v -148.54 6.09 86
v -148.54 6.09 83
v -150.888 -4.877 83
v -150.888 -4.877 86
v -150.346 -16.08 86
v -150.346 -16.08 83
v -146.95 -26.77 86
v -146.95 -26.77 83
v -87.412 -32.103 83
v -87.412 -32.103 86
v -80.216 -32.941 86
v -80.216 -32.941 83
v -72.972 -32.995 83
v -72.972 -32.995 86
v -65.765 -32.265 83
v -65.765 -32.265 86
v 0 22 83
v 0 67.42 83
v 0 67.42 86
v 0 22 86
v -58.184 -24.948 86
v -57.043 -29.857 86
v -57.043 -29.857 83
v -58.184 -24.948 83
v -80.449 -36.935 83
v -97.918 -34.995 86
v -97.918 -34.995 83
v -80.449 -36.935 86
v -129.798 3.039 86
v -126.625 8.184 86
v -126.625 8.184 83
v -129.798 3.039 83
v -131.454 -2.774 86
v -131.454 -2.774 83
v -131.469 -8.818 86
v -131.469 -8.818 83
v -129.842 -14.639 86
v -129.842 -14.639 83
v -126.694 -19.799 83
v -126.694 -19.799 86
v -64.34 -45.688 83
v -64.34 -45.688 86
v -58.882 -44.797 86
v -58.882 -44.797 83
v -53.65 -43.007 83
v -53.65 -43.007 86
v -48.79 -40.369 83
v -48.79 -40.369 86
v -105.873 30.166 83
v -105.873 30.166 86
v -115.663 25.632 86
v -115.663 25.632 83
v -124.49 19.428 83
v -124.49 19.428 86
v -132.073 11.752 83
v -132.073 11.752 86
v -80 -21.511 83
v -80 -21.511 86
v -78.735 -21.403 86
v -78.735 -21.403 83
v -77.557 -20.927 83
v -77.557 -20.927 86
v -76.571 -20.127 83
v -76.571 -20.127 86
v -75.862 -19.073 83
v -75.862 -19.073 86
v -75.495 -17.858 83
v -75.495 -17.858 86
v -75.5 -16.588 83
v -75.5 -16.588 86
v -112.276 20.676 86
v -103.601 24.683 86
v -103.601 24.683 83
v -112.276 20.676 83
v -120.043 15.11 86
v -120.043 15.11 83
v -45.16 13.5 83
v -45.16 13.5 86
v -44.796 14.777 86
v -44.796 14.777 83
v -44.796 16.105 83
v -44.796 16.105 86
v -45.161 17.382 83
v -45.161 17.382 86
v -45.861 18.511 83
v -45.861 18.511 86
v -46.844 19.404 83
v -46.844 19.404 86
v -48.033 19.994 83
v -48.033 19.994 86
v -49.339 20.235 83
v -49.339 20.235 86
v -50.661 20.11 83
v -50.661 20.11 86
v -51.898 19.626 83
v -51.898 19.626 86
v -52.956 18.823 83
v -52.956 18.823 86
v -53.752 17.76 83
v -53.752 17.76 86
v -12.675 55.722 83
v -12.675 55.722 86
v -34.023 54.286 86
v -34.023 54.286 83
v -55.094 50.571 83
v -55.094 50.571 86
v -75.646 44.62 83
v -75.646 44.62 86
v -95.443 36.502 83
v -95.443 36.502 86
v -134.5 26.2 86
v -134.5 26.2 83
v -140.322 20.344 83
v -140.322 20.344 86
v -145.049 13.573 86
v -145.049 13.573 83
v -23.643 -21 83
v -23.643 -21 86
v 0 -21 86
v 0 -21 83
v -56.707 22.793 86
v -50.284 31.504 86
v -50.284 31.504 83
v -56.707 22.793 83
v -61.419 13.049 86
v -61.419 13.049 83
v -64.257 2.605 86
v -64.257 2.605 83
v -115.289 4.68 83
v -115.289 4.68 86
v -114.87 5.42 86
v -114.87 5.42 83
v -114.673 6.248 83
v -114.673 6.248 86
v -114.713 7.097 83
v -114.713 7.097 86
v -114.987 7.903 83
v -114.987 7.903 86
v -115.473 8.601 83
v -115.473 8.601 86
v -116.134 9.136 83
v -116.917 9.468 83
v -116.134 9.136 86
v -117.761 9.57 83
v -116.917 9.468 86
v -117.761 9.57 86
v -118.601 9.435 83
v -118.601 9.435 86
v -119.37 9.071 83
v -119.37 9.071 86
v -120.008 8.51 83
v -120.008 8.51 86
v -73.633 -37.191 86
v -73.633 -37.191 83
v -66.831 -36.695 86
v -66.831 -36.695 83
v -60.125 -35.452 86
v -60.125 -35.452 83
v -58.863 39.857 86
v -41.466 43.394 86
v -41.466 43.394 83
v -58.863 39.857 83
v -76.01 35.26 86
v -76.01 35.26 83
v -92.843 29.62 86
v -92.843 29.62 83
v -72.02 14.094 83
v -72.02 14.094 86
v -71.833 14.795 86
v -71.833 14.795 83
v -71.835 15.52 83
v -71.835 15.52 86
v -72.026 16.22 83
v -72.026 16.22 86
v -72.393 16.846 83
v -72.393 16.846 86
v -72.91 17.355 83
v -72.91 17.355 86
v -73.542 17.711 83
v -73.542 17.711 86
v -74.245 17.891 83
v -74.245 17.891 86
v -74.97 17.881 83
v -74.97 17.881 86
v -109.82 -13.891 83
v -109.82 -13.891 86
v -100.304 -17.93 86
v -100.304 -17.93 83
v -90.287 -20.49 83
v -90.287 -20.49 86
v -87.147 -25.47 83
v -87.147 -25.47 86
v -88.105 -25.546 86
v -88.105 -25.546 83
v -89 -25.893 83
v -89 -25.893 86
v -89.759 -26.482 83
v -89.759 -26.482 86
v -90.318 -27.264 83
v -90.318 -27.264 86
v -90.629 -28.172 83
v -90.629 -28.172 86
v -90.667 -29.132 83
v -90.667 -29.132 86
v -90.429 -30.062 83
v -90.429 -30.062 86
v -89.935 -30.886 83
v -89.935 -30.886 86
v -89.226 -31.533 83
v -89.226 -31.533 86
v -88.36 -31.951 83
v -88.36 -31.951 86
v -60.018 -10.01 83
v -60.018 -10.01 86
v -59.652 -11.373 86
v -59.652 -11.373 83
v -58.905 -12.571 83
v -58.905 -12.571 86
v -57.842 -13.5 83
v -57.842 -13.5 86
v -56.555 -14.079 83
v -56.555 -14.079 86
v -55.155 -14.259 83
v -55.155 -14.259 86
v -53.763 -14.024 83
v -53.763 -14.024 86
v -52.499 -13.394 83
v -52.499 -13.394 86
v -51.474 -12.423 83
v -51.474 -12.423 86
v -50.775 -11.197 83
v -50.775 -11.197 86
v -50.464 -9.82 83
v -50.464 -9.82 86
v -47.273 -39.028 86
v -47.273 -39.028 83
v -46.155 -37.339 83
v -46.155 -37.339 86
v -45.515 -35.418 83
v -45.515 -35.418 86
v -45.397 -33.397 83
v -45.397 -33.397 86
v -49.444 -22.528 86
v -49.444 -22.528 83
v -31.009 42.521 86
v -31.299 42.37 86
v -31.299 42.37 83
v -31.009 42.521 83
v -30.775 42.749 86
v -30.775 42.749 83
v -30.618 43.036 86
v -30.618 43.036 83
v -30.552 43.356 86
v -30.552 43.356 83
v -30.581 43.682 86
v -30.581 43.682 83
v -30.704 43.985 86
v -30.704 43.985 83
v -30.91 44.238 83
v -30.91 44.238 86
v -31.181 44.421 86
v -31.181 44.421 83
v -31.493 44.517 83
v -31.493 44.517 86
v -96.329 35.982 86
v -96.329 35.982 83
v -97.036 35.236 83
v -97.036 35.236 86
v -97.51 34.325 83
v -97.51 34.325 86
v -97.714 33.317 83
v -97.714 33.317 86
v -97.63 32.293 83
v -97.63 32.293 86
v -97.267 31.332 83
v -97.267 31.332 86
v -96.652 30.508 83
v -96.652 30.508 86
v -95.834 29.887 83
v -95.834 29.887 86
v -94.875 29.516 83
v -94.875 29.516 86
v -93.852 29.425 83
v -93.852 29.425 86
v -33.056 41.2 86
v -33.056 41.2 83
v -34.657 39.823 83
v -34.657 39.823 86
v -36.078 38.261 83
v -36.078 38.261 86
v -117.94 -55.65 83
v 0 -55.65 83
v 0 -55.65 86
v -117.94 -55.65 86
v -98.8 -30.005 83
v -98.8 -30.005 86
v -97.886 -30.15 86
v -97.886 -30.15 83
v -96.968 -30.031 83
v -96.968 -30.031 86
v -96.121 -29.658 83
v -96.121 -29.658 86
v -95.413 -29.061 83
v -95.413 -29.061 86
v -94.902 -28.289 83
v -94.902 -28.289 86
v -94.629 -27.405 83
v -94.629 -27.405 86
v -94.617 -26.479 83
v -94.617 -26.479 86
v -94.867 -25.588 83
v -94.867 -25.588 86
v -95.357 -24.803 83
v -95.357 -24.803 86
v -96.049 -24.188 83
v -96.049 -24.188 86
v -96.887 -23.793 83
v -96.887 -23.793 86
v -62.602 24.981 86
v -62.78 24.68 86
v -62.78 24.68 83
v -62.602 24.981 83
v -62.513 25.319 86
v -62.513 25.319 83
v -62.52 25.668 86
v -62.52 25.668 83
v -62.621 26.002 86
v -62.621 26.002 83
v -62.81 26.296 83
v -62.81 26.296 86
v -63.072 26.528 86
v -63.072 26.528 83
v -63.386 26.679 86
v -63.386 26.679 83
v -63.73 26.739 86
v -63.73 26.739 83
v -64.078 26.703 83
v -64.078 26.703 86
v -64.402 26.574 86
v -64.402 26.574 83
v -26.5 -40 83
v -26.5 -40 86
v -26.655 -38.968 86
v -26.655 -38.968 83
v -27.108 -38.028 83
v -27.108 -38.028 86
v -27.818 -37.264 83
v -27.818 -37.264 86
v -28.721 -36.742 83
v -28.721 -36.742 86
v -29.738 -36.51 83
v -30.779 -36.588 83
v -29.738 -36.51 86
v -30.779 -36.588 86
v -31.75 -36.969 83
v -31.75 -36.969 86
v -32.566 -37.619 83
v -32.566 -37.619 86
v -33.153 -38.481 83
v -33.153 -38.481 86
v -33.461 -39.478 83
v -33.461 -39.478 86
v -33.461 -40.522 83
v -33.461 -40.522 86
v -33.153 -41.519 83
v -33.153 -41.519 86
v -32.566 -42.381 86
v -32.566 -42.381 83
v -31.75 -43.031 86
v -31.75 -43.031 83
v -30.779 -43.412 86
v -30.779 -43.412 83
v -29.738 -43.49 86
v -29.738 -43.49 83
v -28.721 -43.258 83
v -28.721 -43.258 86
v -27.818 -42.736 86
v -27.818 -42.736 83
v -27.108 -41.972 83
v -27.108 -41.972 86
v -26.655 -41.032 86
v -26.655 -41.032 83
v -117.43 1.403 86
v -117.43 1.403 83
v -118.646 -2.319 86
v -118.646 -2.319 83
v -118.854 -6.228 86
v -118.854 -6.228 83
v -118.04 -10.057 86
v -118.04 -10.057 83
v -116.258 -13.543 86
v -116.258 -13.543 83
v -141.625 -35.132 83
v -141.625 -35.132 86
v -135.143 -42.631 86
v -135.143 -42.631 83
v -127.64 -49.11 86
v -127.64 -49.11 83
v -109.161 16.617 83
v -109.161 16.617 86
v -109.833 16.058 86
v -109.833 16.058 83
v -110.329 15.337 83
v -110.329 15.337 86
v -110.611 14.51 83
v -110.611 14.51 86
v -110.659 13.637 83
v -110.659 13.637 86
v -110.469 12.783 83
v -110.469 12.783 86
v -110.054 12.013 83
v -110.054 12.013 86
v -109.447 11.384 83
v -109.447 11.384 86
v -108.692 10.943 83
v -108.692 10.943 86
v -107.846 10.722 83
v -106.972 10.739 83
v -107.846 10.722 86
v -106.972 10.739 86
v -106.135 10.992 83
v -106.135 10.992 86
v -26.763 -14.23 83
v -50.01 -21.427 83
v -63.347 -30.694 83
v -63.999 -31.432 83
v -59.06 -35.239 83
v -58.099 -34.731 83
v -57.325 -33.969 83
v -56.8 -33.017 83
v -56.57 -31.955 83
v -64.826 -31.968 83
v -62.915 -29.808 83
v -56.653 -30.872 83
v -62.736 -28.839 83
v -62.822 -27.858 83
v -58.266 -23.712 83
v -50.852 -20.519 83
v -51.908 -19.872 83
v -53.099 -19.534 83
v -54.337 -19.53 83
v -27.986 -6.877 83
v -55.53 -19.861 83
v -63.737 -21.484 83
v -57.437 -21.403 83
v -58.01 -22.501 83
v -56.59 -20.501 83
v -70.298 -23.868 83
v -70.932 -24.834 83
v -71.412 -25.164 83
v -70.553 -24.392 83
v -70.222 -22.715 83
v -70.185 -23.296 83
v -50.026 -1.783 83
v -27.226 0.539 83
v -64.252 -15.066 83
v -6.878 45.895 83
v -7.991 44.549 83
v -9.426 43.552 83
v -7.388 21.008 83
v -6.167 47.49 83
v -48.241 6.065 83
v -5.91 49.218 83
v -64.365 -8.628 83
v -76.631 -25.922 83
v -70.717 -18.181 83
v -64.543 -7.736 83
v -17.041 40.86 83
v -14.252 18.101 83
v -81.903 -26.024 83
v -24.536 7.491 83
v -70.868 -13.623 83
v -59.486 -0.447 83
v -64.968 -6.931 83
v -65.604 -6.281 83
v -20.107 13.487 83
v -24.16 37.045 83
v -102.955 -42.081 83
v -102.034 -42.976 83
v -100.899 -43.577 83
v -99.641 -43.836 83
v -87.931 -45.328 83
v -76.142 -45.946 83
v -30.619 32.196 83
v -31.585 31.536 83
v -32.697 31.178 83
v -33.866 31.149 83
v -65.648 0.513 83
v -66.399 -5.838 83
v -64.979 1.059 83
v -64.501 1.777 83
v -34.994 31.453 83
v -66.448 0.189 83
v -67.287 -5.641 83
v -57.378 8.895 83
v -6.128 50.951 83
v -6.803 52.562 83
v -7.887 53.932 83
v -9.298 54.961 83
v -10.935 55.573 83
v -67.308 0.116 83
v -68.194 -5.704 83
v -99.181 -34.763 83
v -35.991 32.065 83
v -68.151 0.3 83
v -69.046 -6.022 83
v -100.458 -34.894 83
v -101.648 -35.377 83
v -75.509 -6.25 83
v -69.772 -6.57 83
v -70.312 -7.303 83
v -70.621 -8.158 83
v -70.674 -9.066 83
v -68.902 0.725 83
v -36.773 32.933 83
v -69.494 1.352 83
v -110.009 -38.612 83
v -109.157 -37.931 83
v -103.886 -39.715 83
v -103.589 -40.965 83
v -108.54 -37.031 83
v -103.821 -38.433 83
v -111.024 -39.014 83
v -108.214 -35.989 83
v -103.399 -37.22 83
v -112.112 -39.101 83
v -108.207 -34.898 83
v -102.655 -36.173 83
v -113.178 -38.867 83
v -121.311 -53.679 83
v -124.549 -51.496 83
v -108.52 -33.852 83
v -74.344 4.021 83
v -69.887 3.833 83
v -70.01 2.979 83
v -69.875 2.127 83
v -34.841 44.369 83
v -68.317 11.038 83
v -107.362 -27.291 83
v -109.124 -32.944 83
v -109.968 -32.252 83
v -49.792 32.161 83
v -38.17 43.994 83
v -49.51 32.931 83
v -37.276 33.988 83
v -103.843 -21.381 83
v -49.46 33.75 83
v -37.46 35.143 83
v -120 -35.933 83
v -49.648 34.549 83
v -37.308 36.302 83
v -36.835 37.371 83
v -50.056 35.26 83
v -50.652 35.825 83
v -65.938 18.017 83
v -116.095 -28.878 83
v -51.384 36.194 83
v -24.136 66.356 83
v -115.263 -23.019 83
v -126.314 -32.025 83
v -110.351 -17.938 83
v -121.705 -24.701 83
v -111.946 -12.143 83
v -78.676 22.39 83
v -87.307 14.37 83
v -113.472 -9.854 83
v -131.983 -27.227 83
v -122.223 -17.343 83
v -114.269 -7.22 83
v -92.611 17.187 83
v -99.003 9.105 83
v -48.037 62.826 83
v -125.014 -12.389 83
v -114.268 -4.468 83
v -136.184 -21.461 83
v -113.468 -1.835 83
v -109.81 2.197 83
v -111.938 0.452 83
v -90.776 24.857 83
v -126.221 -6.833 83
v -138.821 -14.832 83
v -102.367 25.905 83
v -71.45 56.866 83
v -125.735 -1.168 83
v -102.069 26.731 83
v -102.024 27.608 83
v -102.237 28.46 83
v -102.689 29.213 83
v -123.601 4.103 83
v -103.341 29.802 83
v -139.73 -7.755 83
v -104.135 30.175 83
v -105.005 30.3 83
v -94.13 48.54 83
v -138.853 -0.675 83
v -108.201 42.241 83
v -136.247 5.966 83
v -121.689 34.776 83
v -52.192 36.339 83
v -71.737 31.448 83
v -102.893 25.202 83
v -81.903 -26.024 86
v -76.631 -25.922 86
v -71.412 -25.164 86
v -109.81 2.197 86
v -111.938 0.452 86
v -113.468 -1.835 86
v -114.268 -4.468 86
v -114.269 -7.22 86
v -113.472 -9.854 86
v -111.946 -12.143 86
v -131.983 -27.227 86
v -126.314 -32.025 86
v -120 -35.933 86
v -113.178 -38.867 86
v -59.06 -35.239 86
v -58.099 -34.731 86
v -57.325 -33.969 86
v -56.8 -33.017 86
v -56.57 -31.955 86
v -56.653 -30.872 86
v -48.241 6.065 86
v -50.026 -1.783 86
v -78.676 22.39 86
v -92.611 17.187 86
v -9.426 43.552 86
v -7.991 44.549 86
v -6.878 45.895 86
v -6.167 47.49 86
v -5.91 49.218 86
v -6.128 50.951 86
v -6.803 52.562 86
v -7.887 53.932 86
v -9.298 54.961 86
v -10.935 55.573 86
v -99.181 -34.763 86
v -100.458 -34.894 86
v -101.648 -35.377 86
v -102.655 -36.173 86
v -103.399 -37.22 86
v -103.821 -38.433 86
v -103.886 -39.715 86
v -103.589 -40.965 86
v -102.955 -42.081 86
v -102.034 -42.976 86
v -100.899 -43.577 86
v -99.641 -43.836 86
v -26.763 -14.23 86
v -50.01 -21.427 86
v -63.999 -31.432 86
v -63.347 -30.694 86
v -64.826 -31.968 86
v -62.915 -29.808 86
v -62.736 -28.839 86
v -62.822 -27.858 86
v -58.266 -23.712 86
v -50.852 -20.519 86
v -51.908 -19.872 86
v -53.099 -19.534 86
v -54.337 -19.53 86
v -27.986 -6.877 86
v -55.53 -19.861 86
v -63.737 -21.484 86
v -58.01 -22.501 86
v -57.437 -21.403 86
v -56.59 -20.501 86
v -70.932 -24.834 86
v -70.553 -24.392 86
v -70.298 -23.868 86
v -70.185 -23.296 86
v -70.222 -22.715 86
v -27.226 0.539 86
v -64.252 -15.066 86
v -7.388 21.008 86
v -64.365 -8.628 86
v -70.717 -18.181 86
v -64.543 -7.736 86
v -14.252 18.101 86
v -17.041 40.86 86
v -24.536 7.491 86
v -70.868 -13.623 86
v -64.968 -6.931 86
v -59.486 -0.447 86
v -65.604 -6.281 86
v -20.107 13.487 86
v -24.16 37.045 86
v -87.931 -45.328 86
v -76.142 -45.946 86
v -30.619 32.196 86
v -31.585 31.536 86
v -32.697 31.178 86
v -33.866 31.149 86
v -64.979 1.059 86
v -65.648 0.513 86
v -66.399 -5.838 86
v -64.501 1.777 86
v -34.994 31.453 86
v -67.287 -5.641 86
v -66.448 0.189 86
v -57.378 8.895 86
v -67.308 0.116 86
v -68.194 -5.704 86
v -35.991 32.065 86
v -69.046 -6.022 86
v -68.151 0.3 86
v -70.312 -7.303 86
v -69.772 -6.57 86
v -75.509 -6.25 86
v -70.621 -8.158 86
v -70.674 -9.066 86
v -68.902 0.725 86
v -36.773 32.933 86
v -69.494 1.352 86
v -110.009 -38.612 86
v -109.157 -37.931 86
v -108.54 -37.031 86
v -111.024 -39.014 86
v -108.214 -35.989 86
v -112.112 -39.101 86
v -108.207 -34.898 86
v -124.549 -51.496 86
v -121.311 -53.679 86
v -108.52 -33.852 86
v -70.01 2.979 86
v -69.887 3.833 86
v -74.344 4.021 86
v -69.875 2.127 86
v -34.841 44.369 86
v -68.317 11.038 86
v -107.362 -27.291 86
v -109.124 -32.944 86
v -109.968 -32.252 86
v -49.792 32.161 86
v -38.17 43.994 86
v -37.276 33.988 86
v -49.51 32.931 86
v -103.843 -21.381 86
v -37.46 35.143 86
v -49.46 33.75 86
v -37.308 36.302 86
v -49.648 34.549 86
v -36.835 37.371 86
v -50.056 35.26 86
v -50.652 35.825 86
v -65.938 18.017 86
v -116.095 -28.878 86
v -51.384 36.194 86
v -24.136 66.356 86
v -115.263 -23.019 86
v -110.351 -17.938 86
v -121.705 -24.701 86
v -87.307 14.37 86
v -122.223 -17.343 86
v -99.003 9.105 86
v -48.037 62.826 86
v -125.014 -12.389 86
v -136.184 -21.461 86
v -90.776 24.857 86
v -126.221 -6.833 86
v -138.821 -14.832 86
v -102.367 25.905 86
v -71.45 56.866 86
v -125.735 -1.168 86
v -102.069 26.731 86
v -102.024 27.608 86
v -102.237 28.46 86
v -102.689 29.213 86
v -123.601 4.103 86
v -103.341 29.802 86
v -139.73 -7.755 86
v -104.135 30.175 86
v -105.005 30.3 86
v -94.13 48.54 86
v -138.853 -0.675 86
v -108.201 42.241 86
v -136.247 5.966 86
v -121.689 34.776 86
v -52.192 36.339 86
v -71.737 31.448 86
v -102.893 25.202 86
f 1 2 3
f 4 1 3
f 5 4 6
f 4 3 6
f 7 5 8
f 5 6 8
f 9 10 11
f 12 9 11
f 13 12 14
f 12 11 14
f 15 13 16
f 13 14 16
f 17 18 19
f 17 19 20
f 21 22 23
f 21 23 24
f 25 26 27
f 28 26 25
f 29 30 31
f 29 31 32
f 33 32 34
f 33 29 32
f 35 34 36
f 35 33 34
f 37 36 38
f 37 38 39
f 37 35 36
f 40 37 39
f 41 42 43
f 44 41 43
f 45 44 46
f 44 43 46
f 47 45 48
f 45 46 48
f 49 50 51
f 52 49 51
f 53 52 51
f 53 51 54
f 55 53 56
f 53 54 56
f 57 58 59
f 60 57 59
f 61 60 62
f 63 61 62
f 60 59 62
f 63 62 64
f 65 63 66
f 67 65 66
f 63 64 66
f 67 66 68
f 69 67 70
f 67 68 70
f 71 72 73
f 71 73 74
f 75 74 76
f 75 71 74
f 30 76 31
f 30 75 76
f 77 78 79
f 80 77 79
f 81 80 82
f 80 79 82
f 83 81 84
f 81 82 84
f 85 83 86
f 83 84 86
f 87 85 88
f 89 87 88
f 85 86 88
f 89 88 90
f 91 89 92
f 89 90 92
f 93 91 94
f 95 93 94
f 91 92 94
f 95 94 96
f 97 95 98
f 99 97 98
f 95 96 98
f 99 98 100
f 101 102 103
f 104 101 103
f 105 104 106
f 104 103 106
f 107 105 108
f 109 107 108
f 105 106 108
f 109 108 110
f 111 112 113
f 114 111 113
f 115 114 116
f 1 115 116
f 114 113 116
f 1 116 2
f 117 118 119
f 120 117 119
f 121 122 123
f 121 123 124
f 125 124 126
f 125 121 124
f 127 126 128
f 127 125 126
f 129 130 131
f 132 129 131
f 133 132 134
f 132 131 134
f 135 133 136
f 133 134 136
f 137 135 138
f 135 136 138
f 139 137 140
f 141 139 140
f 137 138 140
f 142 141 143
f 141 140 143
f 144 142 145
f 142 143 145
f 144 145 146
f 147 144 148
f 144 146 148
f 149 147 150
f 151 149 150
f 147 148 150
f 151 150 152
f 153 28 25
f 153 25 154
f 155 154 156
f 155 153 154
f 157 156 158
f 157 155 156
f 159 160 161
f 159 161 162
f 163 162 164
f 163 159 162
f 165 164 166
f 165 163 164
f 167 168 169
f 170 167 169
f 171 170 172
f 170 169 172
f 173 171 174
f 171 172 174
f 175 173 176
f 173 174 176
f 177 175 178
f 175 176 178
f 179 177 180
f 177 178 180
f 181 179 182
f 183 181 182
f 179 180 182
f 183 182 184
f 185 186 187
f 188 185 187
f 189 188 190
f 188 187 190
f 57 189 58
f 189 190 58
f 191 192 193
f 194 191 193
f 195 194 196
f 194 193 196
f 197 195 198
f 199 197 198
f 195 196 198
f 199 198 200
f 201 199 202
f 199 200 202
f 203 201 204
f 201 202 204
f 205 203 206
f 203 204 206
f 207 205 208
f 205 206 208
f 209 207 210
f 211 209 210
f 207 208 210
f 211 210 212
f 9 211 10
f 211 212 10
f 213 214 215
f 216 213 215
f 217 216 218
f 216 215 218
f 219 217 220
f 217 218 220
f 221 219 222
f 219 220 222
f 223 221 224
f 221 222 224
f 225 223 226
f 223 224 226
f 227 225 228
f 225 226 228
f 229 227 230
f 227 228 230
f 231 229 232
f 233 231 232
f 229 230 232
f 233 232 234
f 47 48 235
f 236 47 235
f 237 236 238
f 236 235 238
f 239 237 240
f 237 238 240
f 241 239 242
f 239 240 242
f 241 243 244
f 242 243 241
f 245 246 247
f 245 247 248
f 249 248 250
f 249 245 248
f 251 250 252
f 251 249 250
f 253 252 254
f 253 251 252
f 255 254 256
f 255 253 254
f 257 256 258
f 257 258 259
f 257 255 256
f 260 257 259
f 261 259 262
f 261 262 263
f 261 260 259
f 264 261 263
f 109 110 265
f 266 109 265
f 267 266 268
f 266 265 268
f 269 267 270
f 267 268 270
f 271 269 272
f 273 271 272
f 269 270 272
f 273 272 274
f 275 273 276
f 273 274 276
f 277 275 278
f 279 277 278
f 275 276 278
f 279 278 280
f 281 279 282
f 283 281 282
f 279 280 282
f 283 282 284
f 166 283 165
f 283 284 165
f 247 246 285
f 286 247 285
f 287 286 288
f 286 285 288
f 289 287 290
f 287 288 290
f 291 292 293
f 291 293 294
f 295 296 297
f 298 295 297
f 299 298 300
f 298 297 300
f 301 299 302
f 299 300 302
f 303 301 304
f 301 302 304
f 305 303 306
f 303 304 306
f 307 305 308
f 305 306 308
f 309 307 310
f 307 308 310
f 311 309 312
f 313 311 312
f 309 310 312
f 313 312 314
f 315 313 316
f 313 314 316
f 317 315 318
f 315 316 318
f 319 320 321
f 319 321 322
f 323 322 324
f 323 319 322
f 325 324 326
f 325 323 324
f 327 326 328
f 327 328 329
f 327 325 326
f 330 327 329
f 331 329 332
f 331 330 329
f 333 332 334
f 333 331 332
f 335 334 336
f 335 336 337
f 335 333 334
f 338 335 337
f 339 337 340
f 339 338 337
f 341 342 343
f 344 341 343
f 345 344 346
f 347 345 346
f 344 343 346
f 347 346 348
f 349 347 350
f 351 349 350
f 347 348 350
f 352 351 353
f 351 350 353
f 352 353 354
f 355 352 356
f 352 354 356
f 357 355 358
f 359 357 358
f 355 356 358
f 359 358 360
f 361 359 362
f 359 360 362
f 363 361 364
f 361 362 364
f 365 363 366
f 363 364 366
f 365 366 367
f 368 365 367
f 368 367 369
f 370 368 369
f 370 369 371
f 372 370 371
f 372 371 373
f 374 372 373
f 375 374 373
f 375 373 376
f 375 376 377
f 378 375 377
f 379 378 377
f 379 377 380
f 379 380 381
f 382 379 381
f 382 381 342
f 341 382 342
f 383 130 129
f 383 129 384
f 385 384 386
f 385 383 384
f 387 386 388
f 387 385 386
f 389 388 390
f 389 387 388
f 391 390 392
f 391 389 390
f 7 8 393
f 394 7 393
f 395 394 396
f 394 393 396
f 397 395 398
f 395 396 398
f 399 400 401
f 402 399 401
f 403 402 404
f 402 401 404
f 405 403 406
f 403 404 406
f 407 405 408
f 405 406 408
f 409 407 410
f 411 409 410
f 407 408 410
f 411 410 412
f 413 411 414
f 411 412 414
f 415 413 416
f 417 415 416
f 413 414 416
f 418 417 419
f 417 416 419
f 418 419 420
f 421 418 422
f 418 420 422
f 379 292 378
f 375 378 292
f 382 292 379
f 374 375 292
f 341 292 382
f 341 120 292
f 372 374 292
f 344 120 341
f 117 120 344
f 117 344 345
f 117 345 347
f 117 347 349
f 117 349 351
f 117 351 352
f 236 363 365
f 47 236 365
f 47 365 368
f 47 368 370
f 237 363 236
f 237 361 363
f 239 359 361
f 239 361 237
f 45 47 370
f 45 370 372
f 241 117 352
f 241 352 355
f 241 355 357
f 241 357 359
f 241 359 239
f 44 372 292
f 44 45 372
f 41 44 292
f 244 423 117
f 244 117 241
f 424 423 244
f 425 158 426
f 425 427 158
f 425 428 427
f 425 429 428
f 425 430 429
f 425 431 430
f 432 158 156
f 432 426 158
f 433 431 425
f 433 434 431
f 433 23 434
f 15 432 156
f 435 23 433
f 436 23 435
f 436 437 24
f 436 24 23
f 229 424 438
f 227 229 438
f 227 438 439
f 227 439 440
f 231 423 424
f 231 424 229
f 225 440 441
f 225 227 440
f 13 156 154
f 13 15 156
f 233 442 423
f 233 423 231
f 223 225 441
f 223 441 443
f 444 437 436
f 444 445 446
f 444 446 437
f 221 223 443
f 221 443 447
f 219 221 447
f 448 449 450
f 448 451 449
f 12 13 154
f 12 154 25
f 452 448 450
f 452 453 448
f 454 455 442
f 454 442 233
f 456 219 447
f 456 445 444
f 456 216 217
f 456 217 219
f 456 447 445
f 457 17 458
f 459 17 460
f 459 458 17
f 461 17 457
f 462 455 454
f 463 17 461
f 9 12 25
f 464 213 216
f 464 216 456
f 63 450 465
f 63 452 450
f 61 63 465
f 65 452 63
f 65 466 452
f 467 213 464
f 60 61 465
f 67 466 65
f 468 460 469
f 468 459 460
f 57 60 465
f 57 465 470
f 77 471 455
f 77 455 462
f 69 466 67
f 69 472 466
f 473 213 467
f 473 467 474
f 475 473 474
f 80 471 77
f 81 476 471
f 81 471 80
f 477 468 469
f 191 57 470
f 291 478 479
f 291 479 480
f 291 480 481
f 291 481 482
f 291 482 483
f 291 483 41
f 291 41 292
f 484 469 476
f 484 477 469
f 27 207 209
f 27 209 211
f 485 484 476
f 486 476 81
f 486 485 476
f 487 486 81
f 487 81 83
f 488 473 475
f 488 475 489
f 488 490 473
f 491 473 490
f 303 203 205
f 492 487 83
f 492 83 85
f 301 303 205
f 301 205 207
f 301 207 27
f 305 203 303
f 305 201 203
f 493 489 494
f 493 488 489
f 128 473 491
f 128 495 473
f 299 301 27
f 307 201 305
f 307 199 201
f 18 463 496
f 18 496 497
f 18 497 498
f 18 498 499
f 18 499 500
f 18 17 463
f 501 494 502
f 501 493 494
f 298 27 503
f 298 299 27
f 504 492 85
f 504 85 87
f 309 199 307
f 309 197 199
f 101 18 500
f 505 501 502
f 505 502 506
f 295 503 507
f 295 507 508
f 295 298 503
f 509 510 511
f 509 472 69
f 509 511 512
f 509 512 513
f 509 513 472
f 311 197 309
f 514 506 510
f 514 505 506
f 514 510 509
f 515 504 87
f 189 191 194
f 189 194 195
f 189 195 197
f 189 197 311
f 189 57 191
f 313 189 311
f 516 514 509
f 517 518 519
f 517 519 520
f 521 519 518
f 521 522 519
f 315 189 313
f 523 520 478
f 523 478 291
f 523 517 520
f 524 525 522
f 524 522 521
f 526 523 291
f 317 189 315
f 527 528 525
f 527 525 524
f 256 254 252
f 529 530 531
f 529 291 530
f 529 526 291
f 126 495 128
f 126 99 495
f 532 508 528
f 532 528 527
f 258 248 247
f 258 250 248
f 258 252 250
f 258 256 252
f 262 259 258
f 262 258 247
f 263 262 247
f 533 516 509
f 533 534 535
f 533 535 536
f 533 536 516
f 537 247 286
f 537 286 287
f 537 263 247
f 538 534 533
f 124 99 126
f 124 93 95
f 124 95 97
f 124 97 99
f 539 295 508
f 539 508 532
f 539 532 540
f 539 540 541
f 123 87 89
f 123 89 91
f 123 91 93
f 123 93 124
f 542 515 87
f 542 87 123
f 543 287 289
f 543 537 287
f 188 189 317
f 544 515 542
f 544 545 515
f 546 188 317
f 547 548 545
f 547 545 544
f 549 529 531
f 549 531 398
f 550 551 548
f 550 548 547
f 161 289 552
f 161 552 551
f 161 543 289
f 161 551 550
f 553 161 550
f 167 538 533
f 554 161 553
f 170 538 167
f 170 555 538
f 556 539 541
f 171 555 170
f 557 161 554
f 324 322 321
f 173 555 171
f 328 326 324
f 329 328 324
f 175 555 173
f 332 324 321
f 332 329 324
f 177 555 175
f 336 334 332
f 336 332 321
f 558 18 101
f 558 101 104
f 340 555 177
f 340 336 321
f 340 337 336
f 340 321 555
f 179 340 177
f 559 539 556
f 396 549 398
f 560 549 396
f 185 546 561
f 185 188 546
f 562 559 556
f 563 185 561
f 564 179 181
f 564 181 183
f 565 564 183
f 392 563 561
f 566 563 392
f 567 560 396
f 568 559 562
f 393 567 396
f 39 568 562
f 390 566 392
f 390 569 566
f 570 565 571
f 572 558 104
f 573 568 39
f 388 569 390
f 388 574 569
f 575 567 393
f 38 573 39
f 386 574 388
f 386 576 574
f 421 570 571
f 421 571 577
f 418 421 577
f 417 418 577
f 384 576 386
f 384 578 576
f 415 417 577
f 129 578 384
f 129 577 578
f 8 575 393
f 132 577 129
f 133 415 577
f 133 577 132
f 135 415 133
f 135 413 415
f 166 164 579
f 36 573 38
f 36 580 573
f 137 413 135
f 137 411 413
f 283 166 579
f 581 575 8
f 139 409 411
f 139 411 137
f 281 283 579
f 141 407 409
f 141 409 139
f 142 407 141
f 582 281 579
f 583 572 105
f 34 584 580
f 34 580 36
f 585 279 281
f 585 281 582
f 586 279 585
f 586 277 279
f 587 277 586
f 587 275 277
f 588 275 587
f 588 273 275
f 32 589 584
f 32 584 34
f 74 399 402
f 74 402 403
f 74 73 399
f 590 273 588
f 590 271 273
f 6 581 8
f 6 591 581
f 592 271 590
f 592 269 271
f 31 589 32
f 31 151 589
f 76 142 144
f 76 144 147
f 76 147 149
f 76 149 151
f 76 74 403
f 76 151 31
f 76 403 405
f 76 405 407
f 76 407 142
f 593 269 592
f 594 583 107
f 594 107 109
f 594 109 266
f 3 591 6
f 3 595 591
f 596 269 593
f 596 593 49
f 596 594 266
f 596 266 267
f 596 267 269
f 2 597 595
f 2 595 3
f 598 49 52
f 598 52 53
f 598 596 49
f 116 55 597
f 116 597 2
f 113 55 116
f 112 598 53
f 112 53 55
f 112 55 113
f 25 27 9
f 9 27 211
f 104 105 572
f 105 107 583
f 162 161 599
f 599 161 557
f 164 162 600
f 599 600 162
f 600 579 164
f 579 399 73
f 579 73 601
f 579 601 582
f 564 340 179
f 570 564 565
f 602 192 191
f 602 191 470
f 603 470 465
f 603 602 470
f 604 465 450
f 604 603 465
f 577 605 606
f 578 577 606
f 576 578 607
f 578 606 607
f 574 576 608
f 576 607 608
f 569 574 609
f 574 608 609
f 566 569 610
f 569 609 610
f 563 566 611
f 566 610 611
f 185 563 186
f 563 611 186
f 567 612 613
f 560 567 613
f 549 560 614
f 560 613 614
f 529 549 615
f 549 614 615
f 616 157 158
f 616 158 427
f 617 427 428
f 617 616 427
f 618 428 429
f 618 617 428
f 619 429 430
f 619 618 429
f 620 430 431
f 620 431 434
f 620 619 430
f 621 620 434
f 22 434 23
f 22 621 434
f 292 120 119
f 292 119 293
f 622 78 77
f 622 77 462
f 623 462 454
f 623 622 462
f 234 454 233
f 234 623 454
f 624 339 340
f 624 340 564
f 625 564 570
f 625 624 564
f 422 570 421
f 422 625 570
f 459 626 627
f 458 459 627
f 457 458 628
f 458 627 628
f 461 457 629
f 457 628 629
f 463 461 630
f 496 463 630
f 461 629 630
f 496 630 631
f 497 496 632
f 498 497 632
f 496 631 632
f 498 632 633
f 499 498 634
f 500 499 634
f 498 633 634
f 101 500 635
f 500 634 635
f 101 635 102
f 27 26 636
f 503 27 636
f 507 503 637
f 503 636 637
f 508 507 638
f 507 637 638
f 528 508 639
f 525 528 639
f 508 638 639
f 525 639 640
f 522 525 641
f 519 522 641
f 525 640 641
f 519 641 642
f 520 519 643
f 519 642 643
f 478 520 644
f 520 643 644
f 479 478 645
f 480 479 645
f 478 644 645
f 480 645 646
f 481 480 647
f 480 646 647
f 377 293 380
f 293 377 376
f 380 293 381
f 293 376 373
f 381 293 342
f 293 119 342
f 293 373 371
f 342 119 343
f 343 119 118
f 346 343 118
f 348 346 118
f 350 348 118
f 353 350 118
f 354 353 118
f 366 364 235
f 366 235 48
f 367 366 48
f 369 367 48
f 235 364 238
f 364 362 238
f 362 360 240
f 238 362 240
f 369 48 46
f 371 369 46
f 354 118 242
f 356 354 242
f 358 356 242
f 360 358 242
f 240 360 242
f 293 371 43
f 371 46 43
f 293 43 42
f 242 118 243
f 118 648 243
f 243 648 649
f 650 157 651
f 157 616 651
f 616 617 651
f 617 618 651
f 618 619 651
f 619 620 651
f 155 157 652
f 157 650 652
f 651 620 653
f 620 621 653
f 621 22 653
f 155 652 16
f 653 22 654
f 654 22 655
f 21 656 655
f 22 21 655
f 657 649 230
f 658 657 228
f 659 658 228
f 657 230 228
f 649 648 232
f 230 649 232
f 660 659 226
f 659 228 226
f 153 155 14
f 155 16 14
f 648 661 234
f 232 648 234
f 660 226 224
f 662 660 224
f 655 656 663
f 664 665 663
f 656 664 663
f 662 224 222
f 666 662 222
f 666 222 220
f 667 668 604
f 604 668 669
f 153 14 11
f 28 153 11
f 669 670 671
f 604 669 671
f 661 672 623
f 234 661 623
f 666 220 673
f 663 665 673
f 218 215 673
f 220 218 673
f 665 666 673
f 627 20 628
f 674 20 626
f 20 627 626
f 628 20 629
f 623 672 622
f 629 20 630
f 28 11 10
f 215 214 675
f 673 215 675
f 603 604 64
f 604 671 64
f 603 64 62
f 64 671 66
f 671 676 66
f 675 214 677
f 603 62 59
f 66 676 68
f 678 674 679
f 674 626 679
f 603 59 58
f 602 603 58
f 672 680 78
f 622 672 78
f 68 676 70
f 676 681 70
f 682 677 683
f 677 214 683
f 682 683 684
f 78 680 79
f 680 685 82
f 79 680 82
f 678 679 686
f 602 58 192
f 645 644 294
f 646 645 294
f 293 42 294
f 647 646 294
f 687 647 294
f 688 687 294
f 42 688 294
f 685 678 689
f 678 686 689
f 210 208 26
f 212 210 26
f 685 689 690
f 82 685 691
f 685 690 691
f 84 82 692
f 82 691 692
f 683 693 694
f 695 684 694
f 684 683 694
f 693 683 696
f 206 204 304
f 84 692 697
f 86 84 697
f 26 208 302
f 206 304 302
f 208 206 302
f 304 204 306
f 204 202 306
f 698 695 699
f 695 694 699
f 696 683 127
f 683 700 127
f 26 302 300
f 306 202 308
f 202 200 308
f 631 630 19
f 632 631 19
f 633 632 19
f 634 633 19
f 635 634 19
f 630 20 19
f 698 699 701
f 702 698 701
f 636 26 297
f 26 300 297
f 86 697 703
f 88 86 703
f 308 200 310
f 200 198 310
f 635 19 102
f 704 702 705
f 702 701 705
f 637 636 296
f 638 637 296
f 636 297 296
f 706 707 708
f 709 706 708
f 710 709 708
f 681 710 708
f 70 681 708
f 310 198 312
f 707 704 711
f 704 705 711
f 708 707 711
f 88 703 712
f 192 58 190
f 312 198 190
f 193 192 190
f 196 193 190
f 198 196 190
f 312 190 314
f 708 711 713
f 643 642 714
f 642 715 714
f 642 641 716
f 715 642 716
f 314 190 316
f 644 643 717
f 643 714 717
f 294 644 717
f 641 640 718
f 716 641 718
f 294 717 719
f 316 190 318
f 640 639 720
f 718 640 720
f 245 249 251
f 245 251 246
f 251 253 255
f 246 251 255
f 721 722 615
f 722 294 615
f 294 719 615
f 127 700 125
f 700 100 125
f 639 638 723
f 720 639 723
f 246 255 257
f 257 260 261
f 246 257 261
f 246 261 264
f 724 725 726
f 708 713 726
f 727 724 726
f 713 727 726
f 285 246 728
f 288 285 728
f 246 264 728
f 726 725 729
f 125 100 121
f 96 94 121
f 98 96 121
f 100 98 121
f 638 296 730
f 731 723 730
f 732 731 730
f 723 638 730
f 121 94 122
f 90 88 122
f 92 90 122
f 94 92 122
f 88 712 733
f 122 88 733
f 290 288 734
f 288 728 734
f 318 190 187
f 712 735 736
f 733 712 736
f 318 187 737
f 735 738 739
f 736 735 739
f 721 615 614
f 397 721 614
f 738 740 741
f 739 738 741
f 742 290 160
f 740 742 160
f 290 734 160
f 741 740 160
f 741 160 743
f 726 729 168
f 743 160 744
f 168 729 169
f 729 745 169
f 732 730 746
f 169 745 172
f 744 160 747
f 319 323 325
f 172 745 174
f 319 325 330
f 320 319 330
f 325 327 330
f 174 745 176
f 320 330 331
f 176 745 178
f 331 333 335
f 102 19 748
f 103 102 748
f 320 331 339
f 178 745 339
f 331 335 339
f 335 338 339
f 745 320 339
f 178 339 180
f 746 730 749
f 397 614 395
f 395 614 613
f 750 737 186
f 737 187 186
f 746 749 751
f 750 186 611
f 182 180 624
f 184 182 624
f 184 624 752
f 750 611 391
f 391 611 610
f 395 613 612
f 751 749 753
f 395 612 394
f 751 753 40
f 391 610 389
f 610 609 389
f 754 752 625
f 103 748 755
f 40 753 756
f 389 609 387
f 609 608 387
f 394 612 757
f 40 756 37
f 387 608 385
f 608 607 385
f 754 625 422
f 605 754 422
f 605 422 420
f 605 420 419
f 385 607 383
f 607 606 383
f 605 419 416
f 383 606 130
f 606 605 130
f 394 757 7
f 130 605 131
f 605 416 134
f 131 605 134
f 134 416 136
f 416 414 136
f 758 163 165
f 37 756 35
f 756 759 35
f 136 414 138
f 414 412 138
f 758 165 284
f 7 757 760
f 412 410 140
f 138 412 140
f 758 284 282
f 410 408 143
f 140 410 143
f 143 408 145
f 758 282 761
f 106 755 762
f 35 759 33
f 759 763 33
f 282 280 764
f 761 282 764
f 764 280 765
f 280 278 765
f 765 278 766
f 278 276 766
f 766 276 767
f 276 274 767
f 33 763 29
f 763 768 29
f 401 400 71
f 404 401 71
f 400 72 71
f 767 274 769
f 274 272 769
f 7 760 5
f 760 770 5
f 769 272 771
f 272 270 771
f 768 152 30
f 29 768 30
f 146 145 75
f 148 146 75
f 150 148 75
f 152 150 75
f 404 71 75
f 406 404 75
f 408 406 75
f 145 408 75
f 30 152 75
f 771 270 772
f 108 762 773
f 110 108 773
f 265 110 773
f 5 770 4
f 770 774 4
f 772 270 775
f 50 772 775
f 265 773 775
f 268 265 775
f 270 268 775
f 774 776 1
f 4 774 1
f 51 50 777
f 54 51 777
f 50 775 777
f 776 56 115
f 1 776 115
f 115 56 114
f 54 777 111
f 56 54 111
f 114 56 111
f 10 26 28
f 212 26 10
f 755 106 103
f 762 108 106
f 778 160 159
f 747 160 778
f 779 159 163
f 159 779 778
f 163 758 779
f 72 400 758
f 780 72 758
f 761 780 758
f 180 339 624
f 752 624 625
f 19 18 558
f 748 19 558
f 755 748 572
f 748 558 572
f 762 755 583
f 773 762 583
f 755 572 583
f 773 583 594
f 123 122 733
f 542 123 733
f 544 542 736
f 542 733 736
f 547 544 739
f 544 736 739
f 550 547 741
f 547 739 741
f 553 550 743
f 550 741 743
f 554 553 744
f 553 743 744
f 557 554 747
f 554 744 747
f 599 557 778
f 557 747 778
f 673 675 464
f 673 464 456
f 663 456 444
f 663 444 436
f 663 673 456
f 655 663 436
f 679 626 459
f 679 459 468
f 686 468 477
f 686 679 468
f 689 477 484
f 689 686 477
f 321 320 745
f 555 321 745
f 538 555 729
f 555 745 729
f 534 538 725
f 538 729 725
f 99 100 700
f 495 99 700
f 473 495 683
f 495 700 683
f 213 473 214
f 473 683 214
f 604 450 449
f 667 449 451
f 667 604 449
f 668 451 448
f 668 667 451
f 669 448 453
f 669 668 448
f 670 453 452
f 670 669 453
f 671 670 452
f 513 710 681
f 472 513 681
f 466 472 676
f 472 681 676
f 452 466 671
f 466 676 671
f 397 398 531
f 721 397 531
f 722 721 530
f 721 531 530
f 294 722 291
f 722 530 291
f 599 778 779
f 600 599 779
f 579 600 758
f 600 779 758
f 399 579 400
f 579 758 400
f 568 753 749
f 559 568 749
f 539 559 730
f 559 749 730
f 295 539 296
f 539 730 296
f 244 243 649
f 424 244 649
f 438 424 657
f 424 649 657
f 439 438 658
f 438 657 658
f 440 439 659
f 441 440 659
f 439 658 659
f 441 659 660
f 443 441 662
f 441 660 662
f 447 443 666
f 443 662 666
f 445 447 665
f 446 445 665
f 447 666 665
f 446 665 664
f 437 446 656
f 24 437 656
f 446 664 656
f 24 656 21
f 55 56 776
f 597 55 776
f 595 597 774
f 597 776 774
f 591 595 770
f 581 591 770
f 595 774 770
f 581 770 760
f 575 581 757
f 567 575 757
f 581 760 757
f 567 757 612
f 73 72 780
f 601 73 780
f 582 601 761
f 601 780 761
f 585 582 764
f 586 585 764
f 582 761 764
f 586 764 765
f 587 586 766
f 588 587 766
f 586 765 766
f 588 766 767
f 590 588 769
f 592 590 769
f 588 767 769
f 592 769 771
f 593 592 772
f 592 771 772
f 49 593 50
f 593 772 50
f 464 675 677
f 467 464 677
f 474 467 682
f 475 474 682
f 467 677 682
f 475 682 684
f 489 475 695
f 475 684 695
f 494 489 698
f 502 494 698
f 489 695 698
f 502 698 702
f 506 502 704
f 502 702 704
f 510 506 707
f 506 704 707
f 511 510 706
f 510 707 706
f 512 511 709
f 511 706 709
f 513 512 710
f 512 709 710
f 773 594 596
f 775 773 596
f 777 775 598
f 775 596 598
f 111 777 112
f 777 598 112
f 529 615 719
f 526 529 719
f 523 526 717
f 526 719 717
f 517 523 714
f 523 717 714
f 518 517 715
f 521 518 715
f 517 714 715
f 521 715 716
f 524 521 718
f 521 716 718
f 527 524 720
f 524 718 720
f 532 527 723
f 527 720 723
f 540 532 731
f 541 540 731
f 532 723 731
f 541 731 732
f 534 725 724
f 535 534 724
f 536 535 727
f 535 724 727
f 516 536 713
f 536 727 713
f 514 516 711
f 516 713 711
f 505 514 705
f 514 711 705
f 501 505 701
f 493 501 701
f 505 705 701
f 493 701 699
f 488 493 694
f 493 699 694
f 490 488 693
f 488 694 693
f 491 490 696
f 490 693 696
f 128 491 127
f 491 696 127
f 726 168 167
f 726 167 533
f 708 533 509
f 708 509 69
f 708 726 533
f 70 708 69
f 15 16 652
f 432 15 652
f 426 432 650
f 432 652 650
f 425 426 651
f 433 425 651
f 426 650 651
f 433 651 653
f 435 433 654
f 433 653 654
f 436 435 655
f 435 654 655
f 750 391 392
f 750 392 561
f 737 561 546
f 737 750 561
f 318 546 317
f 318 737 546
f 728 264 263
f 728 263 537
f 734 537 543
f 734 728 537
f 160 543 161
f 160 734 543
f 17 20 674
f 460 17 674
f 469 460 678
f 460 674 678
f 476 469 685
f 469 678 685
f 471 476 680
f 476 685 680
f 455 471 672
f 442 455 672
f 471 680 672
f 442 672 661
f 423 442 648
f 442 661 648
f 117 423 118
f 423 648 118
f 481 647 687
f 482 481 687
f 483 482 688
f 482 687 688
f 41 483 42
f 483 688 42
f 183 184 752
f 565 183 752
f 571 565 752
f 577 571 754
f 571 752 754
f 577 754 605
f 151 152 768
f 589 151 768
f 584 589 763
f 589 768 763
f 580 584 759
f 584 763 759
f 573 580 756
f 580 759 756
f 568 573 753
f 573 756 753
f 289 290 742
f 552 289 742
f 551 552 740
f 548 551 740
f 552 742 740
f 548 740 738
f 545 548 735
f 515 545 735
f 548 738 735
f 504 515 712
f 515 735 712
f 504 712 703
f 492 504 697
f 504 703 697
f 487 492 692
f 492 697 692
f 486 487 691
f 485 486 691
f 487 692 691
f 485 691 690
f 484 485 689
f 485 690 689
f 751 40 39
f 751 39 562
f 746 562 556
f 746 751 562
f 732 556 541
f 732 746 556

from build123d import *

# Parameters (mm, degrees)
PAD004_DEPTH        = 3
POCKET007_DEPTH     = 3.001
POCKET008_DEPTH     = 3.001
POCKET009_DEPTH     = 3.001
POCKET010_DEPTH     = 3.001
POCKET011_DEPTH     = 3.001
POCKET012_DEPTH     = 3.001
POCKET013_DEPTH     = 3.001
POCKET014_DEPTH     = 3.001
POCKET015_DEPTH     = 3.001
COPYCOPYSKETCH023_R = 3.5
POCKET033_DEPTH     = 5


with BuildPart() as part:
    # Sketch012 → Pad004 (new body)
    with BuildSketch(Plane.XY):
        with BuildLine():
            Line((0, 67.42), (0, -55.65))
            Line((0, -55.65), (-117.94, -55.65))
            ThreePointArc((-127.64, -49.11), (-122.947197, -52.613151), (-117.94, -55.65))
            ThreePointArc((-146.95, -26.77), (-138.520798, -38.999541), (-127.64, -49.11))
            ThreePointArc((-148.54, 6.09), (-150.980867, -10.496574), (-146.95, -26.77))
            ThreePointArc((-134.5, 26.2), (-142.831473, 17.060618), (-148.54, 6.09))
            ThreePointArc((-94.13, 48.54), (-115.023795, 38.650843), (-134.5, 26.2))
            ThreePointArc((0, 67.42), (-48.036997, 62.826084), (-94.13, 48.54))
        make_face()
    extrude(amount=PAD004_DEPTH)

    # CopySketch001 → Pocket007 (cut, through all)
    with BuildSketch(Plane.XY.offset(3)):
        with BuildLine():
            ThreePointArc((0, 22), (-24.535688, 7.490738), (-23.643181, -21))
            Line((-23.643181, -21), (0, -21))
            Line((0, -21), (0, 22))
        make_face()
        with BuildLine():
            ThreePointArc((-45.15951, 13.5), (-47.417918, 19.740491), (-53.752095, 17.76))
            ThreePointArc((-53.752095, 17.76), (-58.626578, 4.267932), (-60.018385, -10.01))
            ThreePointArc((-60.018385, -10.01), (-55.15457, -14.259051), (-50.463519, -9.82))
            ThreePointArc((-45.15951, 13.5), (-49.299707, 2.178481), (-50.463519, -9.82))
        make_face()
    extrude(amount=-POCKET007_DEPTH, mode=Mode.SUBTRACT)

    # CopySketch002 → Pocket008 (cut, through all)
    with BuildSketch(Plane.XY.offset(3)):
        with BuildLine():
            ThreePointArc((-49.444058, -22.5277), (-54.944649, -19.654794), (-58.184448, -24.9476))
            Line((-57.0427, -29.8572), (-58.184448, -24.9476))
            ThreePointArc((-60.1254, -35.4518), (-57.027903, -33.511958), (-57.0427, -29.8572))
            ThreePointArc((-80.4488, -36.935), (-70.225534, -37.037002), (-60.1254, -35.4518))
            Line((-97.9175, -34.995), (-80.4488, -36.935))
            ThreePointArc((-97.9175, -34.995), (-103.82056, -38.432829), (-99.6413, -43.8364))
            ThreePointArc((-99.6413, -43.8364), (-82.042265, -45.74625), (-64.34, -45.6882))
            ThreePointArc((-64.34, -45.6882), (-56.228822, -44.011588), (-48.7903, -40.3687))
            ThreePointArc((-48.7903, -40.3687), (-46.155403, -37.339305), (-45.3966, -33.3967))
            Line((-49.444058, -22.5277), (-45.3966, -33.3967))
        make_face()
    extrude(amount=-POCKET008_DEPTH, mode=Mode.SUBTRACT)

    # CopySketch003 → Pocket009 (cut, through all)
    with BuildSketch(Plane.XY.offset(3)):
        with BuildLine():
            ThreePointArc((-64.365395, -8.62779), (-67.742586, -5.639295), (-70.674058, -9.0661))
            ThreePointArc((-70.674058, -9.0661), (-70.835475, -15.903269), (-70.2223, -22.7148))
            ThreePointArc((-71.4121, -25.164), (-70.40839, -24.137996), (-70.2223, -22.7148))
            ThreePointArc((-87.147068, -25.4704), (-79.265214, -26.055148), (-71.4121, -25.164))
            ThreePointArc((-87.147068, -25.4704), (-90.683175, -28.650592), (-87.411994, -32.1027))
            ThreePointArc((-87.411994, -32.1027), (-76.595145, -33.065808), (-65.7651, -32.2646))
            ThreePointArc((-65.7651, -32.2646), (-63.346864, -30.693689), (-62.8224, -27.8581))
            ThreePointArc((-64.365395, -8.62779), (-64.044087, -18.279067), (-62.8224, -27.8581))
        make_face()
    extrude(amount=-POCKET009_DEPTH, mode=Mode.SUBTRACT)

    # CopySketch018 → Pocket010 (cut, through all)
    with BuildSketch(Plane.XY.offset(3)):
        with BuildLine():
            ThreePointArc((-72.02, 14.094017), (-72.392692, 16.846151), (-74.97, 17.880861))
            ThreePointArc((-74.97, 17.880861), (-93.250673, 11.950737), (-109.81, 2.196863))
            ThreePointArc((-109.81, 2.196863), (-114.369998, -5.844169), (-109.82, -13.890864))
            ThreePointArc((-109.82, -13.890864), (-95.344007, -19.39947), (-80, -21.511475))
            ThreePointArc((-80, -21.511475), (-76.570681, -20.127404), (-75.5, -16.587696))
            ThreePointArc((-72.02, 14.094017), (-75.072637, -1.097957), (-75.5, -16.587696))
        make_face()
    extrude(amount=-POCKET010_DEPTH, mode=Mode.SUBTRACT)

    # CopySketch019 → Pocket011 (cut, through all)
    with BuildSketch(Plane.XY.offset(3)):
        with BuildLine():
            ThreePointArc((-98.800419, -30.00485), (-94.734065, -27.856904), (-96.886613, -23.792983))
            ThreePointArc((-116.257935, -13.543183), (-107.162558, -19.783674), (-96.886613, -23.792983))
            ThreePointArc((-115.288548, 4.68), (-118.878907, -4.266385), (-116.257935, -13.543183))
            ThreePointArc((-115.288548, 4.68), (-115.784536, 8.891716), (-120.0081, 8.509533))
            ThreePointArc((-120.0081, 8.509533), (-126.190374, -3.981903), (-122.223343, -17.343009))
            ThreePointArc((-122.223343, -17.343009), (-111.413274, -25.3414), (-98.800419, -30.00485))
        make_face()
    extrude(amount=-POCKET011_DEPTH, mode=Mode.SUBTRACT)

    # CopySketch020 → Pocket012 (cut, through all)
    with BuildSketch(Plane.XY.offset(3)):
        with BuildLine():
            ThreePointArc((-103.601499, 24.683247), (-102.23683, 28.460376), (-105.872604, 30.166298))
            ThreePointArc((-105.872604, 30.166298), (-120.215401, 22.727476), (-132.072524, 11.752025))
            ThreePointArc((-132.072524, 11.752025), (-139.729925, -7.755401), (-131.983106, -27.22749))
            ThreePointArc((-131.983106, -27.22749), (-123.229381, -34.095551), (-113.177794, -38.866668))
            ThreePointArc((-113.177794, -38.866668), (-108.540165, -37.030837), (-109.968182, -32.251858))
            ThreePointArc((-126.694192, -19.799013), (-118.971743, -26.885797), (-109.968182, -32.251858))
            ThreePointArc((-126.624592, 8.183725), (-131.669932, -5.795181), (-126.694192, -19.799013))
            ThreePointArc((-103.601499, 24.683247), (-116.290857, 18.07698), (-126.624592, 8.183725))
        make_face()
    extrude(amount=-POCKET012_DEPTH, mode=Mode.SUBTRACT)

    # CopySketch021 → Pocket013 (cut, through all)
    with BuildSketch(Plane.XY.offset(3)):
        with BuildLine():
            ThreePointArc((-50.283742, 31.504046), (-49.647546, 34.54879), (-52.191507, 36.338616))
            ThreePointArc((-52.191507, 36.338616), (-81.328643, 28.362539), (-109.1608, 16.616836))
            ThreePointArc((-109.1608, 16.616836), (-110.288036, 12.383863), (-106.13456, 10.991977))
            ThreePointArc((-64.402467, 26.573807), (-85.690853, 19.914024), (-106.13456, 10.991977))
            ThreePointArc((-62.78, 24.679977), (-62.809905, 26.296266), (-64.402467, 26.573807))
            ThreePointArc((-62.78, 24.679977), (-67.226683, 14.561044), (-69.887292, 3.833184))
            ThreePointArc((-69.887292, 3.833184), (-67.736073, 0.176429), (-64.257156, 2.604748))
            ThreePointArc((-50.283742, 31.504046), (-59.288565, 18.030198), (-64.257156, 2.604748))
        make_face()
    extrude(amount=-POCKET013_DEPTH, mode=Mode.SUBTRACT)

    # CopySketch021001 → Pocket014 (cut, through all)
    with BuildSketch(Plane.XY.offset(3)):
        with BuildLine():
            ThreePointArc((-50.283742, 31.504046), (-49.647546, 34.54879), (-52.191507, 36.338616))
            ThreePointArc((-52.191507, 36.338616), (-81.328643, 28.362539), (-109.1608, 16.616836))
            ThreePointArc((-109.1608, 16.616836), (-110.288036, 12.383863), (-106.13456, 10.991977))
            ThreePointArc((-64.402467, 26.573807), (-85.690853, 19.914024), (-106.13456, 10.991977))
            ThreePointArc((-62.78, 24.679977), (-62.809905, 26.296266), (-64.402467, 26.573807))
            ThreePointArc((-62.78, 24.679977), (-67.226683, 14.561044), (-69.887292, 3.833184))
            ThreePointArc((-69.887292, 3.833184), (-67.736073, 0.176429), (-64.257156, 2.604748))
            ThreePointArc((-50.283742, 31.504046), (-59.288565, 18.030198), (-64.257156, 2.604748))
        make_face()
    extrude(amount=-POCKET014_DEPTH, mode=Mode.SUBTRACT)

    # CopySketch022 → Pocket015 (cut, through all)
    with BuildSketch(Plane.XY.offset(3)):
        with BuildLine():
            ThreePointArc((-95.442672, 36.502192), (-97.482535, 31.79948), (-92.84279, 29.620188))
            ThreePointArc((-41.465962, 43.393869), (-67.471527, 37.690024), (-92.84279, 29.620188))
            ThreePointArc((-31.493419, 44.517429), (-36.50836, 44.210116), (-41.465962, 43.393869))
            ThreePointArc((-31.299124, 42.370301), (-30.554517, 43.520036), (-31.493419, 44.517429))
            ThreePointArc((-31.299124, 42.370301), (-33.877911, 40.536126), (-36.077509, 38.26102))
            ThreePointArc((-36.077509, 38.26102), (-36.412838, 32.470844), (-30.619491, 32.195671))
            ThreePointArc((-9.425793, 43.552177), (-20.673272, 39.08814), (-30.619491, 32.195671))
            ThreePointArc((-9.425793, 43.552177), (-6.127962, 50.951278), (-12.675069, 55.721791))
            ThreePointArc((-12.675069, 55.721791), (-55.094244, 50.570744), (-95.442672, 36.502192))
        make_face()
    extrude(amount=-POCKET015_DEPTH, mode=Mode.SUBTRACT)

    # CopyCopySketch023 → Pocket033 (cut)
    with BuildSketch(Plane.XY.offset(3)):
        with Locations((-30, -40)):
            Circle(COPYCOPYSKETCH023_R)
    extrude(amount=-POCKET033_DEPTH, mode=Mode.SUBTRACT)


with BuildPart() as part_1:
    # Body003 placement: moved
    add(part.part.moved(Location((0, 0, 83))))


solid = part_1.part
